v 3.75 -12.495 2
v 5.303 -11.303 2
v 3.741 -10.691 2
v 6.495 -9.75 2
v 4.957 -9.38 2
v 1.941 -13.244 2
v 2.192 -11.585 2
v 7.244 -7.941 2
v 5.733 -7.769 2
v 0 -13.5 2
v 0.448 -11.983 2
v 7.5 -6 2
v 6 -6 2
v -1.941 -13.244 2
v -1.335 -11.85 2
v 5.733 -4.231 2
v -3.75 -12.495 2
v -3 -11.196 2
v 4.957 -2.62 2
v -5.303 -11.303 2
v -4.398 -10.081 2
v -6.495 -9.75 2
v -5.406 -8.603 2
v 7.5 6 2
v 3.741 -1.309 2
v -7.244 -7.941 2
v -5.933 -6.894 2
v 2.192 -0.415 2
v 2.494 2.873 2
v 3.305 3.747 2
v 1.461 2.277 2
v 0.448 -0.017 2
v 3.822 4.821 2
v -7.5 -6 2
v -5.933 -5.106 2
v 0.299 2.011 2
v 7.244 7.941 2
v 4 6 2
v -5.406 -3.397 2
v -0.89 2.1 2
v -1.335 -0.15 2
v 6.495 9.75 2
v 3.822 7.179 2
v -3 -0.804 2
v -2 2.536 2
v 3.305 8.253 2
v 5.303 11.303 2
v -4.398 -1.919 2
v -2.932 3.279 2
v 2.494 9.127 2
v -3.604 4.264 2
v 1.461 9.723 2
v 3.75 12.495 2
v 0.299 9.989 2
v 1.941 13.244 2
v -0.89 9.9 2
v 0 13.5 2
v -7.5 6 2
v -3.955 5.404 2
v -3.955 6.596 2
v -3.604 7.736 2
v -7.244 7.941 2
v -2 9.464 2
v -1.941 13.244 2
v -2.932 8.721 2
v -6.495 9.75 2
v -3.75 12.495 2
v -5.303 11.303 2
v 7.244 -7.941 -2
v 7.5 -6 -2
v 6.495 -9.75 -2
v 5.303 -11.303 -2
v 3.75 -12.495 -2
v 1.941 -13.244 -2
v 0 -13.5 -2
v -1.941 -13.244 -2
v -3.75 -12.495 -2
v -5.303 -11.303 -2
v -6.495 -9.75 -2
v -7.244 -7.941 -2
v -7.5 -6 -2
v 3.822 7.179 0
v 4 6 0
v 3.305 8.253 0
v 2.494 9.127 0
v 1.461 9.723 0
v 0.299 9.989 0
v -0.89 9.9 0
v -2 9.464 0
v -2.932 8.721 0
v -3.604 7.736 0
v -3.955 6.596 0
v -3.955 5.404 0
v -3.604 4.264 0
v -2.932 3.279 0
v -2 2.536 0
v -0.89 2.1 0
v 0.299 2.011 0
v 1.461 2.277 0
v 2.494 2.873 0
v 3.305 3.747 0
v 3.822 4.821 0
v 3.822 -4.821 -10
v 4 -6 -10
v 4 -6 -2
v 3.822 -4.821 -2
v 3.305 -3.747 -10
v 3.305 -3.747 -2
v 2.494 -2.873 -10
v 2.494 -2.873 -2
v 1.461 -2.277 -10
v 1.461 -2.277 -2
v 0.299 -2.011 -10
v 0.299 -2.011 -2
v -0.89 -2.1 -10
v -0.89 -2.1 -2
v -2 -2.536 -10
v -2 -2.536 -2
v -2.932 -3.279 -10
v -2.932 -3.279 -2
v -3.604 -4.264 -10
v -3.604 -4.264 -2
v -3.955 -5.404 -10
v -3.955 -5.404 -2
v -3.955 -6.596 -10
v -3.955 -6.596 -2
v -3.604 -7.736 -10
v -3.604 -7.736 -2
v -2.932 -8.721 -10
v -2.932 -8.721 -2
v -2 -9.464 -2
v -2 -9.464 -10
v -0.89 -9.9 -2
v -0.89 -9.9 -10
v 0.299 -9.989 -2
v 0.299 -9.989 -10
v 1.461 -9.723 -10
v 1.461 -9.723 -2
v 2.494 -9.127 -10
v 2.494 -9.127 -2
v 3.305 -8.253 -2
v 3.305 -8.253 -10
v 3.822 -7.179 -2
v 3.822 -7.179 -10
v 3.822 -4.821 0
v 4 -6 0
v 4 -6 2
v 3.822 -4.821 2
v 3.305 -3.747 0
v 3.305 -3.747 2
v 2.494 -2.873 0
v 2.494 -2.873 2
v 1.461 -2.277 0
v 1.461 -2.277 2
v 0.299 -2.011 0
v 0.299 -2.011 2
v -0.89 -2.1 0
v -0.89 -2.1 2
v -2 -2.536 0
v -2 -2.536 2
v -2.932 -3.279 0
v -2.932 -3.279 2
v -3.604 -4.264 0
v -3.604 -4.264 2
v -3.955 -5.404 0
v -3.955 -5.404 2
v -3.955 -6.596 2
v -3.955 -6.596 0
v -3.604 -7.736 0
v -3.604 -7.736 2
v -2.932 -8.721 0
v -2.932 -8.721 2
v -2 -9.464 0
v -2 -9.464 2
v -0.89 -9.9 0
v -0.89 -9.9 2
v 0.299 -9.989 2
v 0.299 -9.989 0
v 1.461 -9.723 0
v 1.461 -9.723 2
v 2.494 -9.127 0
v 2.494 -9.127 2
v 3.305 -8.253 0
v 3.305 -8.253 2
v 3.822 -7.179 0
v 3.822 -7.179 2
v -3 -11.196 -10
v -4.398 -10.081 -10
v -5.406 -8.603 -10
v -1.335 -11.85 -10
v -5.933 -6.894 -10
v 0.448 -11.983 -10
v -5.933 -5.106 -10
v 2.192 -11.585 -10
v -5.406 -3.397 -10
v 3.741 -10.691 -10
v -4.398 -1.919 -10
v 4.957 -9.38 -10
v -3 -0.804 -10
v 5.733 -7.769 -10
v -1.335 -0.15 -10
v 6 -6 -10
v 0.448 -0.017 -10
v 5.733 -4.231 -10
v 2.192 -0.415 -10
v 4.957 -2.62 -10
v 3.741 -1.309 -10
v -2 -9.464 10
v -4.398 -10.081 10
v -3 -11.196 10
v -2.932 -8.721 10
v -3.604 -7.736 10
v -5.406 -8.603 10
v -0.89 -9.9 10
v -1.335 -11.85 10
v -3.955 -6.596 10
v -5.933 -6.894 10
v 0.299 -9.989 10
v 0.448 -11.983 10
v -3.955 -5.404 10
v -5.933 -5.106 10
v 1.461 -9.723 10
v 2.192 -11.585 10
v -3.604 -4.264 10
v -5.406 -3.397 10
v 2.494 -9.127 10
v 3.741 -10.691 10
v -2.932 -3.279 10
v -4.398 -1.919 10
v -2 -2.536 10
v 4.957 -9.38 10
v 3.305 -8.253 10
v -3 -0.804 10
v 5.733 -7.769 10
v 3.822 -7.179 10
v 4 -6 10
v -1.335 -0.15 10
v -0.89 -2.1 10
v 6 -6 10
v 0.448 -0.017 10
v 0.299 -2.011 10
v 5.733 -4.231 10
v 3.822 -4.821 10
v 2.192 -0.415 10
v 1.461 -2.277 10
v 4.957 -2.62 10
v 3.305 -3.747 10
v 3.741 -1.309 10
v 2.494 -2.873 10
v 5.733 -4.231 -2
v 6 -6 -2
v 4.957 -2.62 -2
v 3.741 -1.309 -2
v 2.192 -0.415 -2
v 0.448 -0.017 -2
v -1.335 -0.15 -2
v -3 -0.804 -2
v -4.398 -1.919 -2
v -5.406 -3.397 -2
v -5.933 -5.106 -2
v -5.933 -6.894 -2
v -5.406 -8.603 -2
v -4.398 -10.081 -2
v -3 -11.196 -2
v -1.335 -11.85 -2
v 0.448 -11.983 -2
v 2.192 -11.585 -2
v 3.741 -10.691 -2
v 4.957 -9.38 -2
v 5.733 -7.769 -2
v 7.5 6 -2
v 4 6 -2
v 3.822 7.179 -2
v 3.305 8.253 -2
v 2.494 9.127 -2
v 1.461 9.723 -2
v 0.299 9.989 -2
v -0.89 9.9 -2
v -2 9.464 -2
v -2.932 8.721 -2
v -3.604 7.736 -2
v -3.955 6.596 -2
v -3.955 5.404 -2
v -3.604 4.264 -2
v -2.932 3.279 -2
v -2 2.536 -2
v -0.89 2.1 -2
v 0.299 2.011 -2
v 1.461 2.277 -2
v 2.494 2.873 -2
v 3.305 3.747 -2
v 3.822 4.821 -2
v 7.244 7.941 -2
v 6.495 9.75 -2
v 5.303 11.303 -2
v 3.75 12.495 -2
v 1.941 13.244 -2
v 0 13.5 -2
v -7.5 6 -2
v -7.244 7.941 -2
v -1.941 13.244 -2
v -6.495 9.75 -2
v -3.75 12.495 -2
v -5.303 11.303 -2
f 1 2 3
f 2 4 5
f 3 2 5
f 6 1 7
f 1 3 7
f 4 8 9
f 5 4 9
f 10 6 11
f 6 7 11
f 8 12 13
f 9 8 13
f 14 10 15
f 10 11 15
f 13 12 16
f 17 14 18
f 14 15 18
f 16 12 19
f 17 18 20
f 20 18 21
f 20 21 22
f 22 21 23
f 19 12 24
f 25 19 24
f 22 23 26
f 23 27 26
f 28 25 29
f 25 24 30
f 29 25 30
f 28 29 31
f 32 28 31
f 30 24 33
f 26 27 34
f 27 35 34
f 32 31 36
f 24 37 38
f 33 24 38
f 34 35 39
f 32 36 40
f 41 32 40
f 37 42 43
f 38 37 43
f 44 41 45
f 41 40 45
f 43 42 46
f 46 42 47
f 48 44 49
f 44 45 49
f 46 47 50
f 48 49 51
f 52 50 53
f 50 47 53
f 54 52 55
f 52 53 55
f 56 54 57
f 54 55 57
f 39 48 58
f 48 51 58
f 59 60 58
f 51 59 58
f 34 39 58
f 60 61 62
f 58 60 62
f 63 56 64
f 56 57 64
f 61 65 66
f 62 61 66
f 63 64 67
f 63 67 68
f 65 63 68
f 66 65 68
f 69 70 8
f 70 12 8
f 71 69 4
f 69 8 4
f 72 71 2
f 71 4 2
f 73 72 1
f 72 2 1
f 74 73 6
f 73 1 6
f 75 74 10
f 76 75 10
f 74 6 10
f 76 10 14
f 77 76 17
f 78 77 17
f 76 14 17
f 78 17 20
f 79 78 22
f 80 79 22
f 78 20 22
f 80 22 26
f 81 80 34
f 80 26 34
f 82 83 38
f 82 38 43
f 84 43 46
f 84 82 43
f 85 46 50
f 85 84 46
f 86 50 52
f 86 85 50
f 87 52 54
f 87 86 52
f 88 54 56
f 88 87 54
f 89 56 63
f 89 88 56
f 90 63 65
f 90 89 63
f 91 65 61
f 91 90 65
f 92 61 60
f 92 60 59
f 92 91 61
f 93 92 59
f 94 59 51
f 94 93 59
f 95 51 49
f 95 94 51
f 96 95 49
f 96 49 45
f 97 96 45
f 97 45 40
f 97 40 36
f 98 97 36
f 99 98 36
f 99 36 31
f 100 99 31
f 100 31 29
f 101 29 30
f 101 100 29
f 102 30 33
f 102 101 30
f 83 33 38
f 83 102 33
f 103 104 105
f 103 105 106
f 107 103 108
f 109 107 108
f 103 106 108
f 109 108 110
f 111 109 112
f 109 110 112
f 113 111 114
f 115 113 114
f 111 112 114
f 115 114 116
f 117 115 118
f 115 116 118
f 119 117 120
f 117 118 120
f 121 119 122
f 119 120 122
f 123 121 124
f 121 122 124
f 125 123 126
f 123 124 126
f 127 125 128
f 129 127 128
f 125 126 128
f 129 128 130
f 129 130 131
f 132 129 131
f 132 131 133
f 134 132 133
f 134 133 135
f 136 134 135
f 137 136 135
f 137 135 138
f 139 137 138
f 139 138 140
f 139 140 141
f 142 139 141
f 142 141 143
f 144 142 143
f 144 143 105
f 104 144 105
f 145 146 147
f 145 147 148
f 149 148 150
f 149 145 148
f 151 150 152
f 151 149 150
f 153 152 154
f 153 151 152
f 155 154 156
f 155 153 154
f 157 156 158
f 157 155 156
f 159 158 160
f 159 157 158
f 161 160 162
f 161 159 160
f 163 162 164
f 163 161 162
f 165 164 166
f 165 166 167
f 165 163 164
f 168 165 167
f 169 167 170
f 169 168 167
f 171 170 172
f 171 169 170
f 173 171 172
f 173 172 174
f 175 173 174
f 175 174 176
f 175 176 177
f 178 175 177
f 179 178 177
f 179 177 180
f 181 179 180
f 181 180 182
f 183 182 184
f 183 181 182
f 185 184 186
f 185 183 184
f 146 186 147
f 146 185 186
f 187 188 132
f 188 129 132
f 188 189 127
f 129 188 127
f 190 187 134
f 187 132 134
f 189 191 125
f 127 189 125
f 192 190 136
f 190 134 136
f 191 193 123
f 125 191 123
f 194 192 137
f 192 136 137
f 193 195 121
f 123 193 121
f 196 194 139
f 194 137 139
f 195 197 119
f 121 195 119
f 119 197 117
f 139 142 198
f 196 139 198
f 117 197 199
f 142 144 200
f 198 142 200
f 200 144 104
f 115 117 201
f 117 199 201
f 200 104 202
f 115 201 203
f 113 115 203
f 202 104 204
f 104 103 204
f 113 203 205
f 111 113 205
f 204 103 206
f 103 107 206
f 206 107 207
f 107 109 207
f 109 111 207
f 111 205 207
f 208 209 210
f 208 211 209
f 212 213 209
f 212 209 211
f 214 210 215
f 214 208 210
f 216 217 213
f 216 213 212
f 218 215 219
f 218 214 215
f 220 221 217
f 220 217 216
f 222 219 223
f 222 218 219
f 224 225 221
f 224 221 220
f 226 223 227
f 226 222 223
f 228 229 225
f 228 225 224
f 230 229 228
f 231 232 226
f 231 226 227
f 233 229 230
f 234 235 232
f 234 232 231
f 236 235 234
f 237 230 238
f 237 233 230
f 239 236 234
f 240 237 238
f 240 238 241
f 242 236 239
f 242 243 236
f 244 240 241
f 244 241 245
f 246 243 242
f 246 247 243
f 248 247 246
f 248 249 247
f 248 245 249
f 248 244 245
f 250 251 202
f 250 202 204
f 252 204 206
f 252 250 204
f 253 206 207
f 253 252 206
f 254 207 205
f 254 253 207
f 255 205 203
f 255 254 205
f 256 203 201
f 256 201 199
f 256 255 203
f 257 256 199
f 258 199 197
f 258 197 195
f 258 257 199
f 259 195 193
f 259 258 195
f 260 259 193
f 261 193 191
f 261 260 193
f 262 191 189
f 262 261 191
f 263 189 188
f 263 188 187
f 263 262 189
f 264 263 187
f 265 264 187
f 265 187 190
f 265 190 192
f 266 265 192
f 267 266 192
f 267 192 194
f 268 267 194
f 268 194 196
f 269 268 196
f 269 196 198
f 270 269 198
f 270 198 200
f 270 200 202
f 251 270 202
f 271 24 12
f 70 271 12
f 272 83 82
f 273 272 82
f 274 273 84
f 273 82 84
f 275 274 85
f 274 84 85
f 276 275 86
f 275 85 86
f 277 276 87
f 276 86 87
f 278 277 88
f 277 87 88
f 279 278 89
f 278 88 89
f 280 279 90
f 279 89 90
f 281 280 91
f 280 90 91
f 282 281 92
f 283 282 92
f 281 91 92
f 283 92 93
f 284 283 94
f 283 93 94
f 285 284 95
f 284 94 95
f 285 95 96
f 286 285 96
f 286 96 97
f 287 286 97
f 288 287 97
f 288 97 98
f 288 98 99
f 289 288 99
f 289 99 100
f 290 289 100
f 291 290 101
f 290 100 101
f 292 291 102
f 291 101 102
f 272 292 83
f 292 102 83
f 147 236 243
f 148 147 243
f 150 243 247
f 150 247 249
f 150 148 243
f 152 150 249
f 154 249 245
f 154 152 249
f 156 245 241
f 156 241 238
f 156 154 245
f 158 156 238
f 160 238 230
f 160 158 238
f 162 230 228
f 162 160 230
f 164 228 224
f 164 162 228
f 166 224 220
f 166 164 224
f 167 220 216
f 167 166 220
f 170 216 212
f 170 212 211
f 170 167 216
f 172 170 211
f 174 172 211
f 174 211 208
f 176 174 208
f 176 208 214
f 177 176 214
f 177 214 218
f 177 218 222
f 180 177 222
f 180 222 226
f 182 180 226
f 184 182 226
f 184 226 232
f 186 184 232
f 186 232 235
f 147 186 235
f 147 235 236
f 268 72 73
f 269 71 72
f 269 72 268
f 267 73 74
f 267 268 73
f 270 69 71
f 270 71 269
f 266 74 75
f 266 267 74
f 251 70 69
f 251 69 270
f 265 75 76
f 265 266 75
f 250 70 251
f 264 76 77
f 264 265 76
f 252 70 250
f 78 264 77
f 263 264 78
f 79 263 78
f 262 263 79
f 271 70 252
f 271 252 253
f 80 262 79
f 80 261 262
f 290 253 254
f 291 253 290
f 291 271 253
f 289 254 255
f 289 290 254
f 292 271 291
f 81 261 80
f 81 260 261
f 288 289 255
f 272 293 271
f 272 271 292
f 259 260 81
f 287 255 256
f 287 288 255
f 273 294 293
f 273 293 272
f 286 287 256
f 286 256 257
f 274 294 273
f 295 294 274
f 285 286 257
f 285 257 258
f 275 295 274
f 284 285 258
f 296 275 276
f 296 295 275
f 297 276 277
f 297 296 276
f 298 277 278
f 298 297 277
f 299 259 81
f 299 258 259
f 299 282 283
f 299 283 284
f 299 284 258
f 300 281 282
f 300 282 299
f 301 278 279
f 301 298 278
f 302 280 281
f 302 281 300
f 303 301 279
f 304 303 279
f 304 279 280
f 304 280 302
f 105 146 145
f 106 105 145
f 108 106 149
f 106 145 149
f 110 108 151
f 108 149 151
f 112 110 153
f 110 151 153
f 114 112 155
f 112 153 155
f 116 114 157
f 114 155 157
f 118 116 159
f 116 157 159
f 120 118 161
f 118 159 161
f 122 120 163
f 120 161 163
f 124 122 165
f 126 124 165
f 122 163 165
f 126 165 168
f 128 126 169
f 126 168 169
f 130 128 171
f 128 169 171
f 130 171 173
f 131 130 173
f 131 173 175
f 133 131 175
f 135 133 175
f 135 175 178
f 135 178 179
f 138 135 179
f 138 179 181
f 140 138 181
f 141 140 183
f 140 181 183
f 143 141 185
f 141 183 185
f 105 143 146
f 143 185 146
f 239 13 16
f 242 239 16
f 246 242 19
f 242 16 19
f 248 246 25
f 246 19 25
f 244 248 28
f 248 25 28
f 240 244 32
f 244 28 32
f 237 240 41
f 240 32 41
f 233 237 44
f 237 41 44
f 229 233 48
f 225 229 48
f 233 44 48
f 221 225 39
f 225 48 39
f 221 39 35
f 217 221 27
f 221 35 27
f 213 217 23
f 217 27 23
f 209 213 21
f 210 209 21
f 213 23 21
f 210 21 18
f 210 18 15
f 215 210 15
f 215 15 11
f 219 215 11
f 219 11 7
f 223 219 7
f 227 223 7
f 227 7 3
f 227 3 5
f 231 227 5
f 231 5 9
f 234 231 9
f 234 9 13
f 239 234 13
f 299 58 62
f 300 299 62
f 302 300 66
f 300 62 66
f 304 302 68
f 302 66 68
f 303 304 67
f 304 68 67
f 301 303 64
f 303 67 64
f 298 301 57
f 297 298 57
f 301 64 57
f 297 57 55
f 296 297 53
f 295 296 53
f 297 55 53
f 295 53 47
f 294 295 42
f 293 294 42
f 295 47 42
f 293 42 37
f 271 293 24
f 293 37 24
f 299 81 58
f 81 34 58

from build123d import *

# Parameters (mm, degrees)
SALIENTE_EXTRUIR1_DEPTH      = 2
SALIENTE_EXTRUIR1_DEPTH_BACK = 2
CROQUIS2_R                   = 4
SALIENTE_EXTRUIR2_DEPTH      = 10
SALIENTE_EXTRUIR2_DEPTH_BACK = 10
CROQUIS2_3_R                 = 6
CROQUIS2_3_R_2               = 4


with BuildPart() as part:
    # Croquis2 → Saliente-Extruir1 (new, two sides: drawn at the far end of the back side and taken through both)
    with BuildSketch(Plane.XY.offset(-SALIENTE_EXTRUIR1_DEPTH_BACK)):
        with BuildLine():
            Line((7.5, -6), (7.5, 6))
            ThreePointArc((7.5, 6), (0, 13.5), (-7.5, 6))
            Line((-7.5, 6), (-7.5, -6))
            ThreePointArc((-7.5, -6), (0, -13.5), (7.5, -6))
        make_face()
        with Locations((0, 6)):
            Circle(CROQUIS2_R, mode=Mode.SUBTRACT)
        with Locations((0, -6)):
            Circle(CROQUIS2_R, mode=Mode.SUBTRACT)
    extrude(amount=SALIENTE_EXTRUIR1_DEPTH + SALIENTE_EXTRUIR1_DEPTH_BACK)

    # Croquis2<3> → Saliente-Extruir2 (add, two sides: drawn at the far end of the back side and taken through both)
    with BuildSketch(Plane.XY.offset(-SALIENTE_EXTRUIR2_DEPTH_BACK)):
        with Locations((0, -6)):
            Circle(CROQUIS2_3_R)
        with Locations((0, -6)):
            Circle(CROQUIS2_3_R_2, mode=Mode.SUBTRACT)
    extrude(amount=SALIENTE_EXTRUIR2_DEPTH + SALIENTE_EXTRUIR2_DEPTH_BACK)


solid = part.part
